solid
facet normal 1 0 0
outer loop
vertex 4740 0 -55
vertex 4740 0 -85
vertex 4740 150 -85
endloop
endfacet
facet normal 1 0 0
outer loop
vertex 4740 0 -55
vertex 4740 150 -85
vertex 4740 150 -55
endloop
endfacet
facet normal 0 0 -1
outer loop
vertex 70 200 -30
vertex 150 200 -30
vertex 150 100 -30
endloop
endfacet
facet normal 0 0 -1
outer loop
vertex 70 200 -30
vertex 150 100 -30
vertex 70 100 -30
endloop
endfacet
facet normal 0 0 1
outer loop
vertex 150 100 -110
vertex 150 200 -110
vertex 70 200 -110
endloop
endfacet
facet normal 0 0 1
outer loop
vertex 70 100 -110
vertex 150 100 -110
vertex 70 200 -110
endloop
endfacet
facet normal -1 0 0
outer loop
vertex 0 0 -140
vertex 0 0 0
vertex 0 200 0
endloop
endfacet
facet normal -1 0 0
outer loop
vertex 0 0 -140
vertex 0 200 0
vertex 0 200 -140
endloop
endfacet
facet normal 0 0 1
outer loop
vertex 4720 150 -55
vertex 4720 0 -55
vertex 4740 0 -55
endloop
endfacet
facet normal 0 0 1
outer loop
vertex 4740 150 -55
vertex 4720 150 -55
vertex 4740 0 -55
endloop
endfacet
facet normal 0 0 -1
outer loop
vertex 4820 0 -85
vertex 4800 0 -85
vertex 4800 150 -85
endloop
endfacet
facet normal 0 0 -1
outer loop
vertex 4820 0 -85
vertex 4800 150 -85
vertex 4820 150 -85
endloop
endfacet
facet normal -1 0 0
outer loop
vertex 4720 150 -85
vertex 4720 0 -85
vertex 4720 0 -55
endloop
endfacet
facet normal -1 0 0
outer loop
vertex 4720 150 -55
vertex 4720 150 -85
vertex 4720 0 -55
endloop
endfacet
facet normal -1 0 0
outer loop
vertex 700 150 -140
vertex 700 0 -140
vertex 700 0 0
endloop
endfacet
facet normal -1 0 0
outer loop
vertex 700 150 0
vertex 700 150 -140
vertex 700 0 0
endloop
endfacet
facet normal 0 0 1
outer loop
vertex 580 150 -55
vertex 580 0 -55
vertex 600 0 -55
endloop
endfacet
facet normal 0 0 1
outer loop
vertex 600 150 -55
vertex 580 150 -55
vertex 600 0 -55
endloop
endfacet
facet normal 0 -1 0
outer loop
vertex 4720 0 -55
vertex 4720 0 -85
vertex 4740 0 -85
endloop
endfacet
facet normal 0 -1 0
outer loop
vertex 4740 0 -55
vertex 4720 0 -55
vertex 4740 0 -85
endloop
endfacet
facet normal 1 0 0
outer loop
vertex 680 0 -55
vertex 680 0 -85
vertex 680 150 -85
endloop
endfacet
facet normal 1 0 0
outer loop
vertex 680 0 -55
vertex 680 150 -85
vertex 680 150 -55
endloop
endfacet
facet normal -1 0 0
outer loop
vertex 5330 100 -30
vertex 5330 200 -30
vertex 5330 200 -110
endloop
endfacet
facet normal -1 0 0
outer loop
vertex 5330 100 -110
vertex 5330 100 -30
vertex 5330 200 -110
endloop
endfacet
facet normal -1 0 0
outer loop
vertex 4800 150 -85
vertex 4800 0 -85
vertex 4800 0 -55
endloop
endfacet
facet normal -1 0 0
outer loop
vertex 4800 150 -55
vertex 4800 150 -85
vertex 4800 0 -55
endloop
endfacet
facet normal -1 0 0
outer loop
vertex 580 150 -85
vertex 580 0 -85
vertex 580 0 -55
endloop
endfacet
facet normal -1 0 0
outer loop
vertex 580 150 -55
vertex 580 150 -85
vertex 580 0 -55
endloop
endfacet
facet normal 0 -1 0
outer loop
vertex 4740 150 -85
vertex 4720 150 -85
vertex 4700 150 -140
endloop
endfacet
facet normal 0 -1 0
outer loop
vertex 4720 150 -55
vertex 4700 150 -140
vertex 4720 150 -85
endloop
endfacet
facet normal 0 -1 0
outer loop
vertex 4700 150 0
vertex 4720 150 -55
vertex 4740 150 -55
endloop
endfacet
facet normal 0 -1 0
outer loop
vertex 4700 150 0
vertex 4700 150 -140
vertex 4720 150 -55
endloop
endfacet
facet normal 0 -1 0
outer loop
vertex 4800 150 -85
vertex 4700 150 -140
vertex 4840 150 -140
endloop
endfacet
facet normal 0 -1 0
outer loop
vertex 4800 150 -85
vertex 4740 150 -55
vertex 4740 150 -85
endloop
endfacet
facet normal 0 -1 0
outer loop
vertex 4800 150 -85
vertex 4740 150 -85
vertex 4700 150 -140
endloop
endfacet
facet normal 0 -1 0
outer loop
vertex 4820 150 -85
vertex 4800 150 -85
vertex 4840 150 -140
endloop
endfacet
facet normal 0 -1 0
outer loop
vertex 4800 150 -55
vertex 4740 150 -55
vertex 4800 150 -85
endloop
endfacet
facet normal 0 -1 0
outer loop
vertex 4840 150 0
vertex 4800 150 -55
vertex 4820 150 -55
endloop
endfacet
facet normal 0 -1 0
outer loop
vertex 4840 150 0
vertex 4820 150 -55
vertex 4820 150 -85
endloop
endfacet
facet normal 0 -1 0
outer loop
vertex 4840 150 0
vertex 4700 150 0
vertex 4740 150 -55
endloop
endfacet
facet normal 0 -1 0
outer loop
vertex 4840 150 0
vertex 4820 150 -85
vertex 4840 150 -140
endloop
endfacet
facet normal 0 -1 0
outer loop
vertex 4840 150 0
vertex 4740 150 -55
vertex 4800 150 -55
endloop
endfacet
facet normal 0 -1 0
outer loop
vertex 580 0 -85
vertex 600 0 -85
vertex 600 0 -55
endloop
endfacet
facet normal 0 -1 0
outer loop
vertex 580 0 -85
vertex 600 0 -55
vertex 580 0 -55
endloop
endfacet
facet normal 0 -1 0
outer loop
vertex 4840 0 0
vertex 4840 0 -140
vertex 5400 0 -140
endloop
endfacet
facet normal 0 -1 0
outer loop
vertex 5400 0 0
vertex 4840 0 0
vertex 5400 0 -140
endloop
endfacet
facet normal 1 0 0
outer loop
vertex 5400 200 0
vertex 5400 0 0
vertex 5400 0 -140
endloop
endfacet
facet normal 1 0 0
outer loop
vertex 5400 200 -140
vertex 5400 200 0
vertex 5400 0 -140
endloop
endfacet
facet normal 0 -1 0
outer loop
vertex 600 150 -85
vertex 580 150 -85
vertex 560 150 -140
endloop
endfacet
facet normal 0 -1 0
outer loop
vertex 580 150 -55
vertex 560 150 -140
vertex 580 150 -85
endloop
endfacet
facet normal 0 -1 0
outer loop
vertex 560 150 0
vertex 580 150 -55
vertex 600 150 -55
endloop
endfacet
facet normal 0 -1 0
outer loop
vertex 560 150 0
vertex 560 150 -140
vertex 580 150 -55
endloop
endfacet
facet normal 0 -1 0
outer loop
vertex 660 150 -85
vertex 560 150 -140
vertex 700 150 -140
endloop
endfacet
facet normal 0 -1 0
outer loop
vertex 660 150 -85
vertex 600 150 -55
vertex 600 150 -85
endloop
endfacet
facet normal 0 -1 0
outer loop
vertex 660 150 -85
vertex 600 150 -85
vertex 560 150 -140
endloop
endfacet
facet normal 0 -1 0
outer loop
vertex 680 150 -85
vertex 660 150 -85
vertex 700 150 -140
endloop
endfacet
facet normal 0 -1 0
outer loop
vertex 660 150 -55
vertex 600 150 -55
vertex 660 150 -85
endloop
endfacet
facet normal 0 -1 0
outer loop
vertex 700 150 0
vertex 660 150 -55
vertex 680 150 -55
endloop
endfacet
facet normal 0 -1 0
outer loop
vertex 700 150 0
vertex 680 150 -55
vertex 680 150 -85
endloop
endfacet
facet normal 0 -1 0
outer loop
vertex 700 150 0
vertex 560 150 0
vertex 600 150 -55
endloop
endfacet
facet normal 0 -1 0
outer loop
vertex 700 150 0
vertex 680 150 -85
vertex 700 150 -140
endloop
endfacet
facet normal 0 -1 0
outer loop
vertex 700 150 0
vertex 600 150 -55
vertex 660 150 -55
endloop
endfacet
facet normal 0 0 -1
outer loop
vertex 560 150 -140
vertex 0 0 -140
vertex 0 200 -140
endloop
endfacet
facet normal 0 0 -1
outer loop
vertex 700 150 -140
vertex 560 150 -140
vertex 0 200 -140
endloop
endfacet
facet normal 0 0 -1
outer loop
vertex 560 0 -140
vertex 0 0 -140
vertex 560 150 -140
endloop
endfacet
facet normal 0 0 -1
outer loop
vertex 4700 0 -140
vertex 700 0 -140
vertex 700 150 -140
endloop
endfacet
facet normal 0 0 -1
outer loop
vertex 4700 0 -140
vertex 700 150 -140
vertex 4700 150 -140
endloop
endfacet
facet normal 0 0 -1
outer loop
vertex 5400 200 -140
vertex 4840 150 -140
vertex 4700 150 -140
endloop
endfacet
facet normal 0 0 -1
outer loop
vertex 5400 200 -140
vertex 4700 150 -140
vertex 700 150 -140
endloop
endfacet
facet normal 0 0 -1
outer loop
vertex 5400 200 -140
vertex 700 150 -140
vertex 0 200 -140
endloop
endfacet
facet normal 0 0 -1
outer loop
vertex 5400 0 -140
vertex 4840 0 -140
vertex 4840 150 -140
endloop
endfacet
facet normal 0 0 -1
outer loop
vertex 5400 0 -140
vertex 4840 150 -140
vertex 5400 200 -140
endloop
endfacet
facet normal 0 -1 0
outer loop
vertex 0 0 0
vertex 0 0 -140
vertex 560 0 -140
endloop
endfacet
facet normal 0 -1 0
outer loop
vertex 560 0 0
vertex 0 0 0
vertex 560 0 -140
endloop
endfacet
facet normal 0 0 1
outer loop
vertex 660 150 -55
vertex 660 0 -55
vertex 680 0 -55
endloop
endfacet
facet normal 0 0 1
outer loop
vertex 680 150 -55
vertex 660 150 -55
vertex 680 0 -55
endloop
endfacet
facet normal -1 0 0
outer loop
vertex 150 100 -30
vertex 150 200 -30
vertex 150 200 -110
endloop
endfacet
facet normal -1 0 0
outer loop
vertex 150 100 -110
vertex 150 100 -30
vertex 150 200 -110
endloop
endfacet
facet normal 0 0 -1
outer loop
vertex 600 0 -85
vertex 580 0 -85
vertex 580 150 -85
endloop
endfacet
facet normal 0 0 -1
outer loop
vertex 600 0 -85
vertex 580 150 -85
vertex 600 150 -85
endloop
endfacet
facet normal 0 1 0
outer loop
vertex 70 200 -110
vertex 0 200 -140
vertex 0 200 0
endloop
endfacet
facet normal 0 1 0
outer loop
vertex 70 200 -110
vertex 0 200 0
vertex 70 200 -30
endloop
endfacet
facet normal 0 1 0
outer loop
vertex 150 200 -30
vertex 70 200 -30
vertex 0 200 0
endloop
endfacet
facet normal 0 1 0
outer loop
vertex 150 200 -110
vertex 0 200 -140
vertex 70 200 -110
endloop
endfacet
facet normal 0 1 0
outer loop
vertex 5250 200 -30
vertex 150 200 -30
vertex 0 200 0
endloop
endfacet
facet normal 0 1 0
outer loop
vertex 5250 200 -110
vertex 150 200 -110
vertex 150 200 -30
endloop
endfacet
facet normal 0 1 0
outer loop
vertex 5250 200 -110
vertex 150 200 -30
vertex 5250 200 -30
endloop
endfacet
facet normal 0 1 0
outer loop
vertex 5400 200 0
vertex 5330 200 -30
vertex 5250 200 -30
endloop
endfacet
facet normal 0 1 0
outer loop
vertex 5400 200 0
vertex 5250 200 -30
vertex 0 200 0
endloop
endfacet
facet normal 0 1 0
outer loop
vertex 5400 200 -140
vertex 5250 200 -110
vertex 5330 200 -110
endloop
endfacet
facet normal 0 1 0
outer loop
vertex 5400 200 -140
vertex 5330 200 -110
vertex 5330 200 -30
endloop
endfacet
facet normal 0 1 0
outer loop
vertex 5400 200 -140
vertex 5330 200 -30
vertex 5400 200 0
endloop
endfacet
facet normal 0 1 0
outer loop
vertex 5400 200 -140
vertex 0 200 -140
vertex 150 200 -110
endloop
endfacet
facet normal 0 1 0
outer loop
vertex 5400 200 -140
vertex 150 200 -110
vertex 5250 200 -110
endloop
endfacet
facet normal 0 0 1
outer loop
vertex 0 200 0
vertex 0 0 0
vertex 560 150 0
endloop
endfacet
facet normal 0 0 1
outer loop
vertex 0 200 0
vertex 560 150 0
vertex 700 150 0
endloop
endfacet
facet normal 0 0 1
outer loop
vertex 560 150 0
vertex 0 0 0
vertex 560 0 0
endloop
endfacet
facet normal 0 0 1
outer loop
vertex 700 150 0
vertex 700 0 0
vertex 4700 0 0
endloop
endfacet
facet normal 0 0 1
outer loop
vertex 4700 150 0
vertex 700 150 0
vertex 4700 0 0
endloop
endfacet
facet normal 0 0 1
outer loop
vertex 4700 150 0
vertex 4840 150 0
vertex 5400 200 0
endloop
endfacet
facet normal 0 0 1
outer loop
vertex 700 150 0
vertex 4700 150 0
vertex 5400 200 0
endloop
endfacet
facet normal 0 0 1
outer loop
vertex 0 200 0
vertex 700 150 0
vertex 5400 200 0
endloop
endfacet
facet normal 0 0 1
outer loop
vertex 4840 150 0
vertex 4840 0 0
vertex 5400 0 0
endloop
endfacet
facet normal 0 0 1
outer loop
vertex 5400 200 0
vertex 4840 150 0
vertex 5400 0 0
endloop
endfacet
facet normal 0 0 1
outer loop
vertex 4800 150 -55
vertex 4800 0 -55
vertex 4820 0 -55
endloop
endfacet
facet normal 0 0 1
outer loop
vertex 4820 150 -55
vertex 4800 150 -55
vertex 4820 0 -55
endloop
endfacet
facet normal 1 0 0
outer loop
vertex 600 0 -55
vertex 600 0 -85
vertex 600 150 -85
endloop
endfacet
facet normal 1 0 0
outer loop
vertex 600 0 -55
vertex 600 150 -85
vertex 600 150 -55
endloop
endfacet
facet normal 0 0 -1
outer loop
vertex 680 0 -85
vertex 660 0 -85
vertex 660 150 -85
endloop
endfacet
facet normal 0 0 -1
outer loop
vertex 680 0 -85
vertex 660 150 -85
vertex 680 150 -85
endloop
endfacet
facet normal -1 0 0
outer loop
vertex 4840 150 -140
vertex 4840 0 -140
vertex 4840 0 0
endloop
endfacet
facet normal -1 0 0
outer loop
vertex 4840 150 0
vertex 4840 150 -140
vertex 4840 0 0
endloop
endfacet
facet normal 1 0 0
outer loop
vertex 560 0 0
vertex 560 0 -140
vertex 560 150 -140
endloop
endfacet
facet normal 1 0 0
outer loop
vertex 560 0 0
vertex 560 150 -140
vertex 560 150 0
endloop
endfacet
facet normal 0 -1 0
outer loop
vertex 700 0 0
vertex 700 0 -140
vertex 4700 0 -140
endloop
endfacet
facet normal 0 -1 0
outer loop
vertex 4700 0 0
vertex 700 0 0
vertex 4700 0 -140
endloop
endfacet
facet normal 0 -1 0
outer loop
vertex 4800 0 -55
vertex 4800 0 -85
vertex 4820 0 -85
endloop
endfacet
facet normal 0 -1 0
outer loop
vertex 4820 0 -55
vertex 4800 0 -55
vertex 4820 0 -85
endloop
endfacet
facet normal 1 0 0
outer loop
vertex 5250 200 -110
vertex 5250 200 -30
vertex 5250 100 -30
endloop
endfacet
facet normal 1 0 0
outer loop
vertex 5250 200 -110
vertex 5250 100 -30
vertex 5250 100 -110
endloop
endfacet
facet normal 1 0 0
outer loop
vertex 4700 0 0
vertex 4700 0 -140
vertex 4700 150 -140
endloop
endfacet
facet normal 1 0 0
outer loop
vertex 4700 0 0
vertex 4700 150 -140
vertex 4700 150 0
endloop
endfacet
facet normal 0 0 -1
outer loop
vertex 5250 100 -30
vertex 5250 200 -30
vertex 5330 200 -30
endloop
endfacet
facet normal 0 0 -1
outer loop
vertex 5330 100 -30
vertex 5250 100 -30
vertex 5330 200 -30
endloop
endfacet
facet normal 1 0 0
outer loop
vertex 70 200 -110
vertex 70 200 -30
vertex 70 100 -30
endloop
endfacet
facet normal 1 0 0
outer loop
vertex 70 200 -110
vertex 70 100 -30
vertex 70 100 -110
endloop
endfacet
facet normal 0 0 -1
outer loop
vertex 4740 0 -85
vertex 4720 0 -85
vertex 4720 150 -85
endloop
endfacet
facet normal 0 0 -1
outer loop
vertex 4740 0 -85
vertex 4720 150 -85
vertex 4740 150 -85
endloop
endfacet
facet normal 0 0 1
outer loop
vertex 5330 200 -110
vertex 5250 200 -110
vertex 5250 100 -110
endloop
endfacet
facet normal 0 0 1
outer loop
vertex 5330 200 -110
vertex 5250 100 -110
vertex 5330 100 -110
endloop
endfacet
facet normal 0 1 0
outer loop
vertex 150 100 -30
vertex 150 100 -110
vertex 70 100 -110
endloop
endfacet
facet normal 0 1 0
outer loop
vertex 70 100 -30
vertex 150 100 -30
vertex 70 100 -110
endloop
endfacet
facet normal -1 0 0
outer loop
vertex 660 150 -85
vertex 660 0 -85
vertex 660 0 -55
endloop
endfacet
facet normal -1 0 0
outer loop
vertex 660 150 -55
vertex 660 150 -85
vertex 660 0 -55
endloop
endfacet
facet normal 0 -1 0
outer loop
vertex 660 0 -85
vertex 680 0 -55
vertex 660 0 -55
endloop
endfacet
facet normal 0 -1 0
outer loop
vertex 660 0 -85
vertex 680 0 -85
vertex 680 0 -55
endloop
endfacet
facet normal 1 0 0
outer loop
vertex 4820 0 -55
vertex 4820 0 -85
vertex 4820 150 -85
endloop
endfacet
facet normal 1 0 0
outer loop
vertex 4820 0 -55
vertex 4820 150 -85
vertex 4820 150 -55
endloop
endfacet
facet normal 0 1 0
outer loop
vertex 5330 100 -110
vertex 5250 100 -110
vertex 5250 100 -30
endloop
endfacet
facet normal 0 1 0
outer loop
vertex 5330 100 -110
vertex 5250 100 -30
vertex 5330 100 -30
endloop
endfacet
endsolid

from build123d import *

# Parameters (mm, degrees)
SKETCH_1_W             = 5400
SKETCH_1_H             = 140
EXTRUDE_1_DEPTH        = 200
SKETCH_2_W             = 20
SKETCH_2_H             = 30
EXTRUDE_2_DEPTH        = 150
SKETCH_3_W             = 140
SKETCH_3_H             = 140
SKETCH_3_W_2           = 20
SKETCH_3_H_2           = 30
CUT_EXTRUDE_1_DEPTH    = 150
SKETCH_4_W             = 300
SKETCH_4_H             = 300
CUT_EXTRUDE_4_DEPTH    = 141
PATTERN_LINEAR_3_COUNT = 2
PATTERN_LINEAR_3_PITCH = 4140
SKETCH_5_W             = 80
SKETCH_5_H             = 80
CUT_EXTRUDE_3_DEPTH    = 100


with BuildPart() as part:
    # 草图1 → 凸台-拉伸1 (new body)
    with BuildSketch(Plane(origin=(0, 0, 0), x_dir=(1, 0, 0), z_dir=(0, 1, 0))):
        with Locations((2700, 70)):
            Rectangle(SKETCH_1_W, SKETCH_1_H)
    extrude(amount=EXTRUDE_1_DEPTH)

    # 草图2 → 凸台-拉伸2 (add)
    with BuildSketch(Plane.XZ):
        with Locations((590, -70)):
            Rectangle(SKETCH_2_W, SKETCH_2_H)
        with Locations((670, -70)):
            Rectangle(SKETCH_2_W, SKETCH_2_H)
    extrude(amount=EXTRUDE_2_DEPTH)

    # 草图3 → 切除-拉伸1 (cut)
    with BuildSketch(Plane.XZ):
        with Locations((630, -70)):
            Rectangle(SKETCH_3_W, SKETCH_3_H)
        with Locations((590, -70)):
            Rectangle(SKETCH_3_W_2, SKETCH_3_H_2, mode=Mode.SUBTRACT)
        with Locations((670, -70)):
            Rectangle(SKETCH_3_W_2, SKETCH_3_H_2, mode=Mode.SUBTRACT)
    cut_extrude_1 = extrude(amount=-CUT_EXTRUDE_1_DEPTH, mode=Mode.SUBTRACT)

    # 草图4 → 切除-拉伸4 (cut, through all)
    with BuildSketch(Plane(origin=(0, 0, -140), x_dir=(-1, 0, 0), z_dir=(0, 0, -1))):
        with Locations((-710, -150)):
            Rectangle(SKETCH_4_W, SKETCH_4_H)
    extrude(amount=-CUT_EXTRUDE_4_DEPTH, mode=Mode.SUBTRACT)

    # 阵列(线性)3: 切除-拉伸1 ×2
    with Locations(*[(i * PATTERN_LINEAR_3_PITCH, 0, 0) for i in range(1, PATTERN_LINEAR_3_COUNT)]):
        add(cut_extrude_1, mode=Mode.SUBTRACT)

    # 草图5 → 切除-拉伸3 (cut)
    with BuildSketch(Plane(origin=(0, 200, 0), x_dir=(1, 0, 0), z_dir=(0, 1, 0))):
        with Locations((5290, 70)):
            Rectangle(SKETCH_5_W, SKETCH_5_H)
    cut_extrude_3 = extrude(amount=-CUT_EXTRUDE_3_DEPTH, mode=Mode.SUBTRACT)

    # 镜向1: 切除-拉伸3 across plane
    add(cut_extrude_3.mirror(Plane(origin=(2700, 0, 0), x_dir=(0, 0, 1), z_dir=(1, 0, 0))), mode=Mode.SUBTRACT)


solid = part.part
